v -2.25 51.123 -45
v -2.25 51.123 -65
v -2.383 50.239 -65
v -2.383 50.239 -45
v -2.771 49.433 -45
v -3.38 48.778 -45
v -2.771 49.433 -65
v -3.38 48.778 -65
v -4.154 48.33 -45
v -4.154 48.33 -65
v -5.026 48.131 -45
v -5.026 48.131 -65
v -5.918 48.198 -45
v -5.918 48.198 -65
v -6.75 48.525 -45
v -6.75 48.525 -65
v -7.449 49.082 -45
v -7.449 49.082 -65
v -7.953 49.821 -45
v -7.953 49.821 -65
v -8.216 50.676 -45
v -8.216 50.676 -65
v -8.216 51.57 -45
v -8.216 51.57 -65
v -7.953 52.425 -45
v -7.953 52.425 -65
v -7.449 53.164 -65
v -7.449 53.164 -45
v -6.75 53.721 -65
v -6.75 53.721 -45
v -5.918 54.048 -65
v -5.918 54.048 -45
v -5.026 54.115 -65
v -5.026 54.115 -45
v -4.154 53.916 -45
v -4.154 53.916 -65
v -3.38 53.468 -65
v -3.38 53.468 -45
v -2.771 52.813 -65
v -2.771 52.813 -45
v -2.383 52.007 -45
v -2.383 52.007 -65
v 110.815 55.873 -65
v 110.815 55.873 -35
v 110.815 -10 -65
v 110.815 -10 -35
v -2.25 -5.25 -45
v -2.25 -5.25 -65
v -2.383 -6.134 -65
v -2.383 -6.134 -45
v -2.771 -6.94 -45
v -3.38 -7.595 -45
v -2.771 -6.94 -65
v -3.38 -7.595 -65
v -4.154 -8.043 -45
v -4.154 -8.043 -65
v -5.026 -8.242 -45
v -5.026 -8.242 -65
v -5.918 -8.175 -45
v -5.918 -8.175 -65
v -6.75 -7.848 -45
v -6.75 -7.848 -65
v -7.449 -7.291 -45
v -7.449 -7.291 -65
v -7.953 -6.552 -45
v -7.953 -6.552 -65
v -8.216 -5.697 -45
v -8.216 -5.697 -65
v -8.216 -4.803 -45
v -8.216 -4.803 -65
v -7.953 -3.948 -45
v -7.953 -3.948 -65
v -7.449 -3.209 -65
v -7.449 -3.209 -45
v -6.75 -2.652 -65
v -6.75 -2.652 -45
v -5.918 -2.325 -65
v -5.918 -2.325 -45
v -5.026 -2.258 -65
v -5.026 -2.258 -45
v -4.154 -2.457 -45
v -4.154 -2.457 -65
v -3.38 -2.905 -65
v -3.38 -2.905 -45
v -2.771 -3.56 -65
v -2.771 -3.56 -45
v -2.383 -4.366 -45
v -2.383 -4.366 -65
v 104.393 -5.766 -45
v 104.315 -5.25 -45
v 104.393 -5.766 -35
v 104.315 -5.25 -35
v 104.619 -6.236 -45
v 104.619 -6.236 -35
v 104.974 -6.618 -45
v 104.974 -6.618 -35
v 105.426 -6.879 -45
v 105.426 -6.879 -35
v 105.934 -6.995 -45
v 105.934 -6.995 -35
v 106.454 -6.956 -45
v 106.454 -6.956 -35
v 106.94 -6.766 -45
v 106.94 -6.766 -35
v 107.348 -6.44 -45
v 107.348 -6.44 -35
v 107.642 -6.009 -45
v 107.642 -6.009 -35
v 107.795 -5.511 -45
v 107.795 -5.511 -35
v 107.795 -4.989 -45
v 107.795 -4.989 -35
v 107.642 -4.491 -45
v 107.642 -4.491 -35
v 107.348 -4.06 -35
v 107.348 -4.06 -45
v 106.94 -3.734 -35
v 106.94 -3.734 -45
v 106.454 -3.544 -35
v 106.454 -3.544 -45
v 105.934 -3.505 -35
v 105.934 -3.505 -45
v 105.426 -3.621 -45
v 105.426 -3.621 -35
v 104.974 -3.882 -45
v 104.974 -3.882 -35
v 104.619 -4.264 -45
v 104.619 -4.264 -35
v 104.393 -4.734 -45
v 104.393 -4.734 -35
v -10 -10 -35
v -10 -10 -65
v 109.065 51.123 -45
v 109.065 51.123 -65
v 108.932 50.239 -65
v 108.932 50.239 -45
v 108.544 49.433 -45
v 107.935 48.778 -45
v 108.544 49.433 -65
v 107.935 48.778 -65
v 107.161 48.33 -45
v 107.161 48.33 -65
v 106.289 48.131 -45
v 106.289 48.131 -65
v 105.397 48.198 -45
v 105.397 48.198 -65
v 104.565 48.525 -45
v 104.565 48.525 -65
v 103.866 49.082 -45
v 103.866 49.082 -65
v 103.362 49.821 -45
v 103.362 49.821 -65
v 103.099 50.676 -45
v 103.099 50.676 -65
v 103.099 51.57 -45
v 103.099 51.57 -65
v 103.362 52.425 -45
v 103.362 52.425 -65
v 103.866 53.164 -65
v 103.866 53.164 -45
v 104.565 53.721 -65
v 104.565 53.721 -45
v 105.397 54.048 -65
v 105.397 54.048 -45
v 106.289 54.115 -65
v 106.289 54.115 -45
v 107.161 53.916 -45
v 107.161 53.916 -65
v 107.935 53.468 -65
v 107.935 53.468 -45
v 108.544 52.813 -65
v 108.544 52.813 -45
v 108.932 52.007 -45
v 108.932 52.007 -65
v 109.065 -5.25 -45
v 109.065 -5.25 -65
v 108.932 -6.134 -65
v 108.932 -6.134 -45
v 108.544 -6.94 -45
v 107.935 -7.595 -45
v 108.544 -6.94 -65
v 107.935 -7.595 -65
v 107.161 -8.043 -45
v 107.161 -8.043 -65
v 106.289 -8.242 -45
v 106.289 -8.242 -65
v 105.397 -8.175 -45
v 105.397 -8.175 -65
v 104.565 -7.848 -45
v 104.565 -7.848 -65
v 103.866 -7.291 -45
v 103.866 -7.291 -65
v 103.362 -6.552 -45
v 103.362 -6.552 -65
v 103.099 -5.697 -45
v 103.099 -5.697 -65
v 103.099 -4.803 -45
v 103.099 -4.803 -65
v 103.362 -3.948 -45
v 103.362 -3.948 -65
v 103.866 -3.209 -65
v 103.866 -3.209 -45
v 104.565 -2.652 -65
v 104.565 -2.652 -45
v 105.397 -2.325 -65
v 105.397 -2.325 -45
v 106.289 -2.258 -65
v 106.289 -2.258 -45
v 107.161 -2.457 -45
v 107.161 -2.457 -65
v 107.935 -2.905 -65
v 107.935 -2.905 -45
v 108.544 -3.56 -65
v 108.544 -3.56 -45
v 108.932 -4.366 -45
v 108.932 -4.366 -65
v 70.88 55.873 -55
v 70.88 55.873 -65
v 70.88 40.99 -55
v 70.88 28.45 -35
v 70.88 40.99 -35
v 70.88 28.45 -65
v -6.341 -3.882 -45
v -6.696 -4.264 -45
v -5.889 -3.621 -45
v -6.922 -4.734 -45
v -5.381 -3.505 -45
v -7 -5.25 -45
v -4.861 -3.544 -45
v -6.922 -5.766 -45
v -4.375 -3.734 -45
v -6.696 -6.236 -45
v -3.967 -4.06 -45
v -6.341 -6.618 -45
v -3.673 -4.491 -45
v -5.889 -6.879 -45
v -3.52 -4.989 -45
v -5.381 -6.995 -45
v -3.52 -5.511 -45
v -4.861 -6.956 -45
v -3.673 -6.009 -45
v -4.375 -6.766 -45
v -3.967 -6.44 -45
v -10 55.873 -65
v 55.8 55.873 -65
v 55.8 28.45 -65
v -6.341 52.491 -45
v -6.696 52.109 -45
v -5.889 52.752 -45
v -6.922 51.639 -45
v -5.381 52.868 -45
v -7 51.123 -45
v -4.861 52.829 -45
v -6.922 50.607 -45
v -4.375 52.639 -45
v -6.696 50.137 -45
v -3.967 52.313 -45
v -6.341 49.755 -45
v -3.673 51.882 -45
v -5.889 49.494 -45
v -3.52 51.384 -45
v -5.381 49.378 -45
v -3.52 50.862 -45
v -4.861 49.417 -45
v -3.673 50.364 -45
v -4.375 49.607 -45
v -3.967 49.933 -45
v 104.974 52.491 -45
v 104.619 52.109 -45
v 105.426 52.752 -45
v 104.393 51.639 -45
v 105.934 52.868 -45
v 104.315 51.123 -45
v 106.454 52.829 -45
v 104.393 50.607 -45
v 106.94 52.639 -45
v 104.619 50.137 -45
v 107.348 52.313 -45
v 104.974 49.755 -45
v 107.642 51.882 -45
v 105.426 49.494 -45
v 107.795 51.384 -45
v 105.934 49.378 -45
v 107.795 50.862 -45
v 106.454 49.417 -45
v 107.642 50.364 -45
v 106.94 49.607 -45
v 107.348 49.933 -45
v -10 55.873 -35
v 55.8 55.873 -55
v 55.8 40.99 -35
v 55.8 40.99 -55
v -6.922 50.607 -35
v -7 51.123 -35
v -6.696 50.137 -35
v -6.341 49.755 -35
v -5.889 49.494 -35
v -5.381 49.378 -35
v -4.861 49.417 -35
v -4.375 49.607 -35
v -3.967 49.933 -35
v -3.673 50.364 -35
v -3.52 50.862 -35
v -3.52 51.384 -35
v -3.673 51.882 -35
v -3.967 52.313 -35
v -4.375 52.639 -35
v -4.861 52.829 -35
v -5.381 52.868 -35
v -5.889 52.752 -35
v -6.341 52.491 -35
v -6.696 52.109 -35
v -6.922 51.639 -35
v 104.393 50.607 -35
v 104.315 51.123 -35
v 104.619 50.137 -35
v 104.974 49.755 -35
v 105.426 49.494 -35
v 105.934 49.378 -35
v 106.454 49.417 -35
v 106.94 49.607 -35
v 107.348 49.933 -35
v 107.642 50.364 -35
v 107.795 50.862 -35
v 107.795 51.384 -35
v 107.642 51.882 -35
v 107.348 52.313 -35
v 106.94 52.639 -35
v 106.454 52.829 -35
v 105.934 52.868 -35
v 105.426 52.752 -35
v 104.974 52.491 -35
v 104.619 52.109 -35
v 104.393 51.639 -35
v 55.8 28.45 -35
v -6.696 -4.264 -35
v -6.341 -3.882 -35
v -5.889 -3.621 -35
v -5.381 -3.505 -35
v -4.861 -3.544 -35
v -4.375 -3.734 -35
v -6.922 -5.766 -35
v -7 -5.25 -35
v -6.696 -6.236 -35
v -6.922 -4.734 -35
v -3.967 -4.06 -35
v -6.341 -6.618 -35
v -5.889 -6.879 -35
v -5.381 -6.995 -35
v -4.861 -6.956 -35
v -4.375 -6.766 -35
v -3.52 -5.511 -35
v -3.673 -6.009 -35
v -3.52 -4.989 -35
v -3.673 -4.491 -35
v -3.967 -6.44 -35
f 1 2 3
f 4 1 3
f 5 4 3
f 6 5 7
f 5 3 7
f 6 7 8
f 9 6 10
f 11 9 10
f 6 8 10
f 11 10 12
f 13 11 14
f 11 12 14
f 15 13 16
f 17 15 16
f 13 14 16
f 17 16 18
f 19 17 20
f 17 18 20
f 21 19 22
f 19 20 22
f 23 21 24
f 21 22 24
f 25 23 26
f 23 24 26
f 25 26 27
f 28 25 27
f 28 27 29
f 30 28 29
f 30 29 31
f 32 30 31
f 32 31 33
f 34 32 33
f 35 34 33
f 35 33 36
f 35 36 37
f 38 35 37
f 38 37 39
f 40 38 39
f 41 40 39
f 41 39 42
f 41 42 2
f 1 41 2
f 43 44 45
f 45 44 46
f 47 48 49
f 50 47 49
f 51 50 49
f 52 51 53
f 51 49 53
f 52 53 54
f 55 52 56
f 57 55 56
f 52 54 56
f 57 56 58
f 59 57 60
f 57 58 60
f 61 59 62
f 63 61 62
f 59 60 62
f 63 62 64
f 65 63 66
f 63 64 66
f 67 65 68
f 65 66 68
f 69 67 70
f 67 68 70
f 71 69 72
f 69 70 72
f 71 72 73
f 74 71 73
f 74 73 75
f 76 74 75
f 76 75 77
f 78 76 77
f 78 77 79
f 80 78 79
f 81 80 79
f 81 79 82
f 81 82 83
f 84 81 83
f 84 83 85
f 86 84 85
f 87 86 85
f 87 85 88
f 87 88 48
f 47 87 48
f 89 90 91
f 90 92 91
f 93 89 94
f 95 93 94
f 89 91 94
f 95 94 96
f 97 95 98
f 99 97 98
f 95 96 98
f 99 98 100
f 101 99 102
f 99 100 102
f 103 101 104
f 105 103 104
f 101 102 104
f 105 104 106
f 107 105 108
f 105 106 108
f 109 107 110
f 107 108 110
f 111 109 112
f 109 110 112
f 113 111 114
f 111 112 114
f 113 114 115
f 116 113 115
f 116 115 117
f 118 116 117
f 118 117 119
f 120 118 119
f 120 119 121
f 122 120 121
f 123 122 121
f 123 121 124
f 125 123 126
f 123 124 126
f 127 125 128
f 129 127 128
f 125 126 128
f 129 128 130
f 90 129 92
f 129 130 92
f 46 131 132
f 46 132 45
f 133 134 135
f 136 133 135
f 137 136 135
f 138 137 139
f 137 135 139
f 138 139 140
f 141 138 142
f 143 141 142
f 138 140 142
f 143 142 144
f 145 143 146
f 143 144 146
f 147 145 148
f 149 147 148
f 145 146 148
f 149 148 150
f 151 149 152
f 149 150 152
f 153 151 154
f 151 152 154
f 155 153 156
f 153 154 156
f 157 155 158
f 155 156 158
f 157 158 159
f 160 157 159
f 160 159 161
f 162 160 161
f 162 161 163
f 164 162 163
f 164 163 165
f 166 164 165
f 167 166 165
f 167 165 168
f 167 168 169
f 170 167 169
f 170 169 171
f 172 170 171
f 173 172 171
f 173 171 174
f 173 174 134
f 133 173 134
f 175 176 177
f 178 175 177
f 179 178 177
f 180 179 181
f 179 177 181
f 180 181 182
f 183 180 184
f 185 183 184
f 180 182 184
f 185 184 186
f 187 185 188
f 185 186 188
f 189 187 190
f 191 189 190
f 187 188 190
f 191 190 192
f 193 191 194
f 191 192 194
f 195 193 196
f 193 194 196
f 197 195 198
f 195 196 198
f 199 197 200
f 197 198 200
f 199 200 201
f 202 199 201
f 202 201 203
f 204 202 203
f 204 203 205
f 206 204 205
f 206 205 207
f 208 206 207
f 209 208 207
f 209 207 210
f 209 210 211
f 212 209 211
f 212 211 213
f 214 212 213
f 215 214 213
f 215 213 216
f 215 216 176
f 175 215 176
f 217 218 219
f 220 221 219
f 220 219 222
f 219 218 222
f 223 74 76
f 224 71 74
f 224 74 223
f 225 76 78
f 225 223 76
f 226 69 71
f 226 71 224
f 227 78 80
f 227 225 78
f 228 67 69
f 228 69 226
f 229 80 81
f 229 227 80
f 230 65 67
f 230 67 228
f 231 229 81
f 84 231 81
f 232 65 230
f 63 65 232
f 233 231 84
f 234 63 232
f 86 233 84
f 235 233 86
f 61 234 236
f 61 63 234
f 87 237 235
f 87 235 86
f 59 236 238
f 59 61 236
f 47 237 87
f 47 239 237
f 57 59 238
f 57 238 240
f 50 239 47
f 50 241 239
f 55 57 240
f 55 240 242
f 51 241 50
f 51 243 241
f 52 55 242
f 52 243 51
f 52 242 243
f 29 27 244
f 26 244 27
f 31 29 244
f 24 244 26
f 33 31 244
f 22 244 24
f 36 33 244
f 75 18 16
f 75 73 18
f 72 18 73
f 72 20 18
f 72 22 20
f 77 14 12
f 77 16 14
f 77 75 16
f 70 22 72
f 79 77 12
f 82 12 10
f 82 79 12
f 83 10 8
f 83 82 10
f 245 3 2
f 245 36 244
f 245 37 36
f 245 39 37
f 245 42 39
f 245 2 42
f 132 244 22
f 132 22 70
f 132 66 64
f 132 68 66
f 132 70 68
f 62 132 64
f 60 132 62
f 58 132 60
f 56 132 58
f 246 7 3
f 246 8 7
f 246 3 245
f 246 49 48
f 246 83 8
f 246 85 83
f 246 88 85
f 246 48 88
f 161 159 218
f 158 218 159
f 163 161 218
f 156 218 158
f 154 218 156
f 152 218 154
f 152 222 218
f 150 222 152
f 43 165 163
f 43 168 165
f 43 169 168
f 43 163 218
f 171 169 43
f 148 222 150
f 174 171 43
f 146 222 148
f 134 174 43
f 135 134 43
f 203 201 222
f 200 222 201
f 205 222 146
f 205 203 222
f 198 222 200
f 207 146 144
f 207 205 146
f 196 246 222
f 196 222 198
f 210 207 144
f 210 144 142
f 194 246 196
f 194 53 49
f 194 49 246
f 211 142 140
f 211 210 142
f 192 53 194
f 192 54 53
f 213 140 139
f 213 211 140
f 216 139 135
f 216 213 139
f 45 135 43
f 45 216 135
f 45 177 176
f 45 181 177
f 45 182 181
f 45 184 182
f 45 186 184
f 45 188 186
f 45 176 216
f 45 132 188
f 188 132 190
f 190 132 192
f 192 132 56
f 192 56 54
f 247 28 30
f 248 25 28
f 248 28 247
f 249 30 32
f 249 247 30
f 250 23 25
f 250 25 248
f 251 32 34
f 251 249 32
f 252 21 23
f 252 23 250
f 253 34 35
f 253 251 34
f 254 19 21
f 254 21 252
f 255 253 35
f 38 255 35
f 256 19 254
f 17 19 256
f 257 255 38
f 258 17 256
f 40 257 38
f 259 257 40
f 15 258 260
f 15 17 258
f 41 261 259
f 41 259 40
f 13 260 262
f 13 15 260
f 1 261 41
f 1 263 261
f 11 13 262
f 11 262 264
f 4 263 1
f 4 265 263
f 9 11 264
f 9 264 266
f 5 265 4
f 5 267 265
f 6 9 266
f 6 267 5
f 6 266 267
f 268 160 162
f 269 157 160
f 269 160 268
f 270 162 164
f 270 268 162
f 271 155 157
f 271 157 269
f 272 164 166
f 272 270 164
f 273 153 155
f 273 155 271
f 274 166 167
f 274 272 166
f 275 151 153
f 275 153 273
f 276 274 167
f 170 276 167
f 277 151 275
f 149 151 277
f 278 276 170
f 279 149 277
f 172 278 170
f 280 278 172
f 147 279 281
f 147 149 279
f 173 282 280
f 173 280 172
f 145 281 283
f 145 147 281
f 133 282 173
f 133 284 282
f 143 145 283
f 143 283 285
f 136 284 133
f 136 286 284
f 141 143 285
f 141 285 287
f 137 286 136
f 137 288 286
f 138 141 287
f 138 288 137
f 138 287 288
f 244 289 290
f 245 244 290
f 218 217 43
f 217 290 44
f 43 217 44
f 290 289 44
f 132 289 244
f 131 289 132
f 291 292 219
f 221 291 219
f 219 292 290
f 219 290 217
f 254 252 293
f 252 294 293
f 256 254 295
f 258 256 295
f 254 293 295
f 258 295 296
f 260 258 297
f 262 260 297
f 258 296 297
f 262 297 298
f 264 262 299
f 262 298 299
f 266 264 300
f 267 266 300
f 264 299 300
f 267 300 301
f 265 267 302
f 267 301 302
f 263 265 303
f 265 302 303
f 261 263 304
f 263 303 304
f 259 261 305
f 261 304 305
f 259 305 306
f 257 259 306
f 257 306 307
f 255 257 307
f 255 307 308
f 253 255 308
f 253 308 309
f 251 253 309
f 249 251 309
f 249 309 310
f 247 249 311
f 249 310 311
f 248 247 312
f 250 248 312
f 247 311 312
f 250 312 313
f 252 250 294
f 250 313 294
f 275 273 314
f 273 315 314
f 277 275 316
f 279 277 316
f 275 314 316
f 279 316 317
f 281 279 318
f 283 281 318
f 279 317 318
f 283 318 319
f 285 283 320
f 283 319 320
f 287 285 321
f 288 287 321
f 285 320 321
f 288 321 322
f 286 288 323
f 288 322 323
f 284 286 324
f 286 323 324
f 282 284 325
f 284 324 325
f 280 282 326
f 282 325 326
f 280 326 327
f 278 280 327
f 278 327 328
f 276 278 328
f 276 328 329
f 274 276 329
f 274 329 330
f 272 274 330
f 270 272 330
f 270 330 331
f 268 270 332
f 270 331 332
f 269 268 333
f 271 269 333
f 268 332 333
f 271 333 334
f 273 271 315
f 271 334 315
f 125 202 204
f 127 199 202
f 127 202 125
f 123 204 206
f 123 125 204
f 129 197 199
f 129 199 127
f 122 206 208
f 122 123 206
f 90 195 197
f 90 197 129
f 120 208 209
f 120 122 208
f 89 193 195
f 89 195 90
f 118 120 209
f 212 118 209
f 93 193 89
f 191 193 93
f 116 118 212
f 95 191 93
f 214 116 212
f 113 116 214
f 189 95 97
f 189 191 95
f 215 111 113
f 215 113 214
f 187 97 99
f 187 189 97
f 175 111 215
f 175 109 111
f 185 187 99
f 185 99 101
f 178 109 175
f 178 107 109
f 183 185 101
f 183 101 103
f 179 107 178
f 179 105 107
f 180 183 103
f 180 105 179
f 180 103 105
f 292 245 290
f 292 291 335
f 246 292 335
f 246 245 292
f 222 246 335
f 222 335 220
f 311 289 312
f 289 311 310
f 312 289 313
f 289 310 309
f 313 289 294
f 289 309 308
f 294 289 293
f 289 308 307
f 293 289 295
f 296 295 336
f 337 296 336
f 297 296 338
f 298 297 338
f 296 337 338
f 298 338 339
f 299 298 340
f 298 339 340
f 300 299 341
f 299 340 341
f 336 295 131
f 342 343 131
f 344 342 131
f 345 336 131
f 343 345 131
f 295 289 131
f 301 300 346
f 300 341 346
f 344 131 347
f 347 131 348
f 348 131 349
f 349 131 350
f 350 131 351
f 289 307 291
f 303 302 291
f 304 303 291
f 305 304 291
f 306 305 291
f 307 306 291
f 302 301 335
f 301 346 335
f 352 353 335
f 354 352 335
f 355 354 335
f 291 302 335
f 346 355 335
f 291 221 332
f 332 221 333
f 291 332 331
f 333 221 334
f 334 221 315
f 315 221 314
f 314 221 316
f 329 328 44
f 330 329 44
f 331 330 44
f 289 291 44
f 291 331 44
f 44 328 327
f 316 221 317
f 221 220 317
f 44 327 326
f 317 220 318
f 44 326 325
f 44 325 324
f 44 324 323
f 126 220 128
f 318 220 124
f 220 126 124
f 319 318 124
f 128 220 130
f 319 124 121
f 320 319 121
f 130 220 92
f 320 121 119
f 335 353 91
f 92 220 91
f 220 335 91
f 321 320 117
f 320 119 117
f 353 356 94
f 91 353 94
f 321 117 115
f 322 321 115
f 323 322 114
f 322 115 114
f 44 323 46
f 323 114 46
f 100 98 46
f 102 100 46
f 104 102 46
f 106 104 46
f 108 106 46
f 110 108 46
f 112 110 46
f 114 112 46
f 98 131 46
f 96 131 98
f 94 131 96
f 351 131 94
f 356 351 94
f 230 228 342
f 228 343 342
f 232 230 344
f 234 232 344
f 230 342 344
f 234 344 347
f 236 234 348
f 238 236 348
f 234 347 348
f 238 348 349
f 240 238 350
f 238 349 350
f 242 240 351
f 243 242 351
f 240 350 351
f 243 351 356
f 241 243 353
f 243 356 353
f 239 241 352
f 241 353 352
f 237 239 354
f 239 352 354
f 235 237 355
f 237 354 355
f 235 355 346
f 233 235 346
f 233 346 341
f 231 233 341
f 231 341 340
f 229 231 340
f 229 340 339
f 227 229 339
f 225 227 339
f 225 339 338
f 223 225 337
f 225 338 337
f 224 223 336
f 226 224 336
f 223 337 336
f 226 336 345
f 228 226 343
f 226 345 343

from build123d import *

# Parameters (mm, degrees)
SKETCH008_W         = 120.815
SKETCH008_H         = 65.873
PAD004_DEPTH        = 30
HOLE002_D           = 3.5
HOLE002_CBORE_D     = 6
HOLE002_CBORE_DEPTH = 20
SKETCH010_W         = 15.08
SKETCH010_H         = 12.54
POCKET002_DEPTH     = 30.001
SKETCH011_W         = 15.08
SKETCH011_H         = 14.883
POCKET003_DEPTH     = 10


with BuildPart() as part:
    # Sketch008 (on Face1 of Binder002) → Pad004 (new body)
    with BuildSketch(Plane(origin=(0, 0, -35), x_dir=(1, 0, 0), z_dir=(0, 0, -1))):
        with Locations((50.4075, -22.9365)):
            Rectangle(SKETCH008_W, SKETCH008_H)
    extrude(amount=PAD004_DEPTH)

    # Hole002 (through all)
    with Locations(Plane(origin=(0, 0, -65), x_dir=(1, 0, 0), z_dir=(0, 0, -1))):
        with Locations((-5.25, 5.25), (106.065, 5.25), (106.065, -51.123), (-5.25, -51.123)):
            CounterBoreHole(HOLE002_D / 2, HOLE002_CBORE_D / 2, HOLE002_CBORE_DEPTH)

    # Sketch010 (on Face5 of Hole002) → Pocket002 (cut, through all)
    with BuildSketch(Plane(origin=(0, 0, -65), x_dir=(1, 0, 0), z_dir=(0, 0, -1))):
        with Locations((63.34, -34.72)):
            Rectangle(SKETCH010_W, SKETCH010_H)
    extrude(amount=-POCKET002_DEPTH, mode=Mode.SUBTRACT)

    # Sketch011 (on Face5 of Pocket002) → Pocket003 (cut)
    with BuildSketch(Plane(origin=(0, 0, -65), x_dir=(1, 0, 0), z_dir=(0, 0, -1))):
        with Locations((63.34, -48.4315)):
            Rectangle(SKETCH011_W, SKETCH011_H)
    extrude(amount=-POCKET003_DEPTH, mode=Mode.SUBTRACT)


solid = part.part
